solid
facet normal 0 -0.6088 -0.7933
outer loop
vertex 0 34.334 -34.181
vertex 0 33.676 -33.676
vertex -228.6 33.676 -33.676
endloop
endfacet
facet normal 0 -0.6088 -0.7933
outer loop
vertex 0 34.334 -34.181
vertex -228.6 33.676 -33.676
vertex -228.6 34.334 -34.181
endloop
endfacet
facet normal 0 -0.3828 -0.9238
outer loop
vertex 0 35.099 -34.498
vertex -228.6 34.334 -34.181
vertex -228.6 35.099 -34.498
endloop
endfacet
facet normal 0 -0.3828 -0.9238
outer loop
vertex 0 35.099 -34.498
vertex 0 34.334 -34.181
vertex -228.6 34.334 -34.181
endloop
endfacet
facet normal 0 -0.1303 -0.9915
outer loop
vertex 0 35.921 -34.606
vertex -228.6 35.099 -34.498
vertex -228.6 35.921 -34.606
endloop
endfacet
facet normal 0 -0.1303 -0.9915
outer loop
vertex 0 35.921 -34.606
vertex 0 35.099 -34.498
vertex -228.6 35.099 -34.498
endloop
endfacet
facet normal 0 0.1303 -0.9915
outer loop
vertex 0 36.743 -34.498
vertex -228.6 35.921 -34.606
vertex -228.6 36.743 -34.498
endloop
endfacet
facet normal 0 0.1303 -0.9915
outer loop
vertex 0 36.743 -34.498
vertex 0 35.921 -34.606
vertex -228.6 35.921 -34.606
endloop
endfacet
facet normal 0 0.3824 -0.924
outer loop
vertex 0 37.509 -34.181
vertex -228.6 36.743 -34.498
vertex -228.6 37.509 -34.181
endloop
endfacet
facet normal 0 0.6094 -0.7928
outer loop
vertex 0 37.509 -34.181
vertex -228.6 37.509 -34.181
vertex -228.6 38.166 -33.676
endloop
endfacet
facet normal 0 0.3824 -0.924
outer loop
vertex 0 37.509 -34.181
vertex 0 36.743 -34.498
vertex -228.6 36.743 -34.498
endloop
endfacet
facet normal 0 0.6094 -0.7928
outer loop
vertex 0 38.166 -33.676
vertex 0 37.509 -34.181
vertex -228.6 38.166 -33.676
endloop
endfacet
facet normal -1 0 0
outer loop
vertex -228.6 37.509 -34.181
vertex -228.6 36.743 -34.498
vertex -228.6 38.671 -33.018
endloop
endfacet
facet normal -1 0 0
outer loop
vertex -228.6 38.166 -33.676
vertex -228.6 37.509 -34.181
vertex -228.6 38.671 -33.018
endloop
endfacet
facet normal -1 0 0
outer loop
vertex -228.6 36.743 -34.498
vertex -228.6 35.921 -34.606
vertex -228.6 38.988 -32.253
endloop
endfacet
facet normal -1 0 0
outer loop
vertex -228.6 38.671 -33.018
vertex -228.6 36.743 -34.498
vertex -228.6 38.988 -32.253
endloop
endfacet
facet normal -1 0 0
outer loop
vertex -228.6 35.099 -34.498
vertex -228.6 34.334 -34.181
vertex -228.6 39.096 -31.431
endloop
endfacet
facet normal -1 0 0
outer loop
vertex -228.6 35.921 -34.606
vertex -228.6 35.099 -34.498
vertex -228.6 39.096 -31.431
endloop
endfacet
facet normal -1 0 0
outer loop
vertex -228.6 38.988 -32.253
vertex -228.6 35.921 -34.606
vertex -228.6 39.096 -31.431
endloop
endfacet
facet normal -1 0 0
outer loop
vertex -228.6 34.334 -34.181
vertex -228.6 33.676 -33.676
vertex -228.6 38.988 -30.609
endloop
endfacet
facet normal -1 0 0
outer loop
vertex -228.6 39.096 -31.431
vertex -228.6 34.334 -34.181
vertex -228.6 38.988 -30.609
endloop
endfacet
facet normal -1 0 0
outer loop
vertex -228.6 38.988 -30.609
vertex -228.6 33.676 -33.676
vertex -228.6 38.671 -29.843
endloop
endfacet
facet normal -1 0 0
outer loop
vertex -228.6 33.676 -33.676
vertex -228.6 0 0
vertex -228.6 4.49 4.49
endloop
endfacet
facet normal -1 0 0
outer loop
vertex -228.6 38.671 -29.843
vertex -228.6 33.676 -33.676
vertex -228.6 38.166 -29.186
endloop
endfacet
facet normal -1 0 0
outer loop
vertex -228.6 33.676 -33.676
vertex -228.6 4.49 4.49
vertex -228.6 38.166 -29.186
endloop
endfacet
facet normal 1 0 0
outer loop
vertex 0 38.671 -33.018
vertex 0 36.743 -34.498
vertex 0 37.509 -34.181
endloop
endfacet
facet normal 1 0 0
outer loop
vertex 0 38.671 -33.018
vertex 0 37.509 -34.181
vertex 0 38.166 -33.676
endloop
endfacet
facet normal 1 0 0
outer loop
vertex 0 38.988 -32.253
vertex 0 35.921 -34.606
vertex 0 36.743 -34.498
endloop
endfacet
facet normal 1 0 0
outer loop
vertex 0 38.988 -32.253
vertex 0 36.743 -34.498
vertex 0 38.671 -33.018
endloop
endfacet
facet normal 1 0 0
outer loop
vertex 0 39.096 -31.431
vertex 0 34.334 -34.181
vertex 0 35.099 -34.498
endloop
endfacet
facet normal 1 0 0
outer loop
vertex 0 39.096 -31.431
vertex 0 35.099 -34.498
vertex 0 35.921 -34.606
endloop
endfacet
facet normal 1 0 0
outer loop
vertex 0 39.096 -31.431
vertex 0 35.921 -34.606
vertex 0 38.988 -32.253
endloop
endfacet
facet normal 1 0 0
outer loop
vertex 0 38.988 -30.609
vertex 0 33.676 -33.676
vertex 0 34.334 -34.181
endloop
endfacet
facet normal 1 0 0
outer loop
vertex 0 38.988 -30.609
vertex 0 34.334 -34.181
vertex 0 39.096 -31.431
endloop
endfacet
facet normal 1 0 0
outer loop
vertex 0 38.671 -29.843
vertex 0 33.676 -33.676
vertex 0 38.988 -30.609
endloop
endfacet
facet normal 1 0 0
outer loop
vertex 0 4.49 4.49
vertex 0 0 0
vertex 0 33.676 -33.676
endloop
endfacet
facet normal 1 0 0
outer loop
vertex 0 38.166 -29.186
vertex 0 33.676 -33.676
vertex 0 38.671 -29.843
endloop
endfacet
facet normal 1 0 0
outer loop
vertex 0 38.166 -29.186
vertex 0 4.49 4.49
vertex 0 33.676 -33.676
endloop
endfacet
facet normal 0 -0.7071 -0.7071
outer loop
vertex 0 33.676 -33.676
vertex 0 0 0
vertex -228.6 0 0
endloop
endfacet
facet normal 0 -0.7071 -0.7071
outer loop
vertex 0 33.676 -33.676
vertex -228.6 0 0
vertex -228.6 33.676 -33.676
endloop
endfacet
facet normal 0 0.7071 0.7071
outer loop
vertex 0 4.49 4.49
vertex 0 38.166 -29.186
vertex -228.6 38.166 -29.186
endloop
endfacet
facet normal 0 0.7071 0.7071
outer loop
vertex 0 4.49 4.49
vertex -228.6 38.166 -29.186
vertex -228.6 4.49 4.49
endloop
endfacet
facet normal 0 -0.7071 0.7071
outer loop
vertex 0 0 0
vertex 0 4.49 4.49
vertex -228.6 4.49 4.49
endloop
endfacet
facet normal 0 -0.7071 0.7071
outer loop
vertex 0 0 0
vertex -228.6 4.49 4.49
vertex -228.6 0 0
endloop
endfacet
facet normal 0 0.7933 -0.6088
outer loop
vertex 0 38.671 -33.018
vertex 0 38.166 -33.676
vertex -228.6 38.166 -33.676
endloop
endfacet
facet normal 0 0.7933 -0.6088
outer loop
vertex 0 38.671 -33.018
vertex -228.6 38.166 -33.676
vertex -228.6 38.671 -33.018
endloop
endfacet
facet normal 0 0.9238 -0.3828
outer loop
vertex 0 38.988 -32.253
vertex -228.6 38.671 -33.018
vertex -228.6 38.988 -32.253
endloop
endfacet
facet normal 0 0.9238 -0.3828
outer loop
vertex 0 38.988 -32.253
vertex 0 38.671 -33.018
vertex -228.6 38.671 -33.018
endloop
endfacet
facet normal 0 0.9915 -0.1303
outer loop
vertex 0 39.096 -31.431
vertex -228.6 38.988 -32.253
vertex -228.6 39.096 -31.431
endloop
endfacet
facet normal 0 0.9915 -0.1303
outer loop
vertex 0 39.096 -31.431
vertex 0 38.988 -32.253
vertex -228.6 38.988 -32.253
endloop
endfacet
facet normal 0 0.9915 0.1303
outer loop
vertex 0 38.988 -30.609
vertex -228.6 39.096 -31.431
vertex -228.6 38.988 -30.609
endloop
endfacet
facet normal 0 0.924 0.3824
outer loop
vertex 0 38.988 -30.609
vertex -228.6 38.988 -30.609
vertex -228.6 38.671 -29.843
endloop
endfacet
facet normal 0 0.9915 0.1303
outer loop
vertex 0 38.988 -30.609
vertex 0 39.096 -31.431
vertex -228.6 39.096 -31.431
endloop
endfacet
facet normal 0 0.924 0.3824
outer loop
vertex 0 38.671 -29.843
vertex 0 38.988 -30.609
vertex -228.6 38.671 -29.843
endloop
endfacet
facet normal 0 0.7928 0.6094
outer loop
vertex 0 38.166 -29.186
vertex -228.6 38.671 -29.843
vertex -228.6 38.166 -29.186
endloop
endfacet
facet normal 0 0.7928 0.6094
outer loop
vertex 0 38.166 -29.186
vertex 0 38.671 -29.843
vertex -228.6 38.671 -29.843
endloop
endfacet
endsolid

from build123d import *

# Parameters (mm, degrees)
F1_DEPTH = 228.6


with BuildPart() as f1:
    # F0 (on Right) → F1 (new body)
    with BuildSketch(Plane.YZ):
        with BuildLine():
            Line((4.490128, 4.490128), (0, 0))
            Line((0, 0), (33.67596, -33.67596))
            ThreePointArc((33.67596, -33.67596), (35.921024, -34.605896), (38.166089, -33.67596))
            ThreePointArc((38.166089, -33.67596), (39.096024, -31.430896), (38.166089, -29.185832))
            Line((38.166089, -29.185832), (4.490128, 4.490128))
        make_face()
    extrude(amount=-F1_DEPTH)


solid = f1.part
